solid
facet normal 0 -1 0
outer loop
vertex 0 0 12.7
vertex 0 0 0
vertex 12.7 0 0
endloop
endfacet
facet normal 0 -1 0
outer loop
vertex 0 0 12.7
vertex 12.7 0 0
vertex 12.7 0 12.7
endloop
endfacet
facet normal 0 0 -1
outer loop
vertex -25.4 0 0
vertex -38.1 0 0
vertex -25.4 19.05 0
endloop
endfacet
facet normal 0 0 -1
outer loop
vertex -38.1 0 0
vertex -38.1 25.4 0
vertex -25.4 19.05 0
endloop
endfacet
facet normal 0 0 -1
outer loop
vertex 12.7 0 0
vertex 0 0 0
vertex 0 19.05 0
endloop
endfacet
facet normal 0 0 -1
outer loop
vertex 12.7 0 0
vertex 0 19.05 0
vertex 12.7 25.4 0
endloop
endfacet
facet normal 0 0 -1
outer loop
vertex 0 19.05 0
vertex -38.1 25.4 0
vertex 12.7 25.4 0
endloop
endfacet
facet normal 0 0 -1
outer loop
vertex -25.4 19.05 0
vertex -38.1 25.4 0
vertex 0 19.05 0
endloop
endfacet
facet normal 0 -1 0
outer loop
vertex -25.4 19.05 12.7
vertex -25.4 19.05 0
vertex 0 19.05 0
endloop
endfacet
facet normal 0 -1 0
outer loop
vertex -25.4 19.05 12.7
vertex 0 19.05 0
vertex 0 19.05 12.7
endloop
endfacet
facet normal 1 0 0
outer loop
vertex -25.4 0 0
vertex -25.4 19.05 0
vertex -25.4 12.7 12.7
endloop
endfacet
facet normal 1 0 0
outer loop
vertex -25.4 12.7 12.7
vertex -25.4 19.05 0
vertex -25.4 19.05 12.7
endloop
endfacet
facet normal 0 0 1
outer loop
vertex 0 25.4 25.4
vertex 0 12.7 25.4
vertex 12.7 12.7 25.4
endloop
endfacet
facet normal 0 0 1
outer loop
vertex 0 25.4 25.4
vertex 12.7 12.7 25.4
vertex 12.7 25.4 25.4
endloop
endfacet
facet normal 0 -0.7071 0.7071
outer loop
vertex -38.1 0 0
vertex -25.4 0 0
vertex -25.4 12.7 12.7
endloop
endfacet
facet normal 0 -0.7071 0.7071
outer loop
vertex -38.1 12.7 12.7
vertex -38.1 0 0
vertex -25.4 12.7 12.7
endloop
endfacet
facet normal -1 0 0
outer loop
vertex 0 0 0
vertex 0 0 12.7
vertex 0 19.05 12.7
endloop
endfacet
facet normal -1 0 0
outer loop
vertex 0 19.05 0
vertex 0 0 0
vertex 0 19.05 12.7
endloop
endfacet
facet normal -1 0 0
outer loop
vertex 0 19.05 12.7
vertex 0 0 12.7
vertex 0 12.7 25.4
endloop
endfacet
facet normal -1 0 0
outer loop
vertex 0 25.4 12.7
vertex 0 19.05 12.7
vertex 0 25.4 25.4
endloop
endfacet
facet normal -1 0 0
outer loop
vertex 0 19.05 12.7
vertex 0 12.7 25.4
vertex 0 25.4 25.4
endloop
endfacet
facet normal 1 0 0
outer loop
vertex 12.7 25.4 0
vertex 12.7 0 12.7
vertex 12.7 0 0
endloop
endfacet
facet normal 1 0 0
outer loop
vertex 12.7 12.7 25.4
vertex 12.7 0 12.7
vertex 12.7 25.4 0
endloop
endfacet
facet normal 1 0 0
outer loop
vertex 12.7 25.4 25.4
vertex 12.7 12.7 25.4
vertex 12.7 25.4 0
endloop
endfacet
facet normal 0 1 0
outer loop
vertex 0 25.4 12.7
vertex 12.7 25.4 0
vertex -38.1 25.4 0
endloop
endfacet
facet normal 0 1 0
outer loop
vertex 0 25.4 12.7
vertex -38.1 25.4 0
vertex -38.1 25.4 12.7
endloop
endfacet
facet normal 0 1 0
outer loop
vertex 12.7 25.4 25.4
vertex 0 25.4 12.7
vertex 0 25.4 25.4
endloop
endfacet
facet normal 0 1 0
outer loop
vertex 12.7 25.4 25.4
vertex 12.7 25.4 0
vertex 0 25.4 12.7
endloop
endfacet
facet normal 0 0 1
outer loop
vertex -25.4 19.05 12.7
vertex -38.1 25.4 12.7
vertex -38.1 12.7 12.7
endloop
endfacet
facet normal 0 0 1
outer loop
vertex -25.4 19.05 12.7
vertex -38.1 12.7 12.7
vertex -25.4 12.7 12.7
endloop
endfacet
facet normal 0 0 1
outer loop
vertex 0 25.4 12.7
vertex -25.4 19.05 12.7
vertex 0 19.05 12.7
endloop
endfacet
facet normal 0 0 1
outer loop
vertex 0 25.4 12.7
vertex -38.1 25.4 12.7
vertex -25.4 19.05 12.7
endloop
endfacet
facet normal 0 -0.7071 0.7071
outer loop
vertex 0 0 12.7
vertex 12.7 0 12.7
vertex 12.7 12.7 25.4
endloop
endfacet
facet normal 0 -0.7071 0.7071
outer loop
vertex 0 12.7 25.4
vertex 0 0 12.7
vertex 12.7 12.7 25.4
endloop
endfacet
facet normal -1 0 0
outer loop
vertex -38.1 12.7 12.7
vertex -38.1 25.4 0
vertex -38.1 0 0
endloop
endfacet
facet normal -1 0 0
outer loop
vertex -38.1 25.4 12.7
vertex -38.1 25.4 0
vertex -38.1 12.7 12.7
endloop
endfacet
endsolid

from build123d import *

# Parameters (mm, degrees)
F0_W     = 25.4
F0_H     = 25.4
F1_DEPTH = 12.7
F2_W     = 6.35
F2_H     = 12.7
F3_DEPTH = 38.1
F4_W     = 12.7
F4_H     = 12.7
F5_DEPTH = 19.05
F7_DEPTH = 12.7
F9_DEPTH = 12.7


with BuildPart() as f1:
    # F0 (on Right) → F1 (new body)
    with BuildSketch(Plane.YZ):
        with Locations((12.7, 12.7)):
            Rectangle(F0_W, F0_H)
    extrude(amount=F1_DEPTH)

    # F2 (on Right) → F3 (join)
    with BuildSketch(Plane.YZ):
        with Locations((22.225, 6.35)):
            Rectangle(F2_W, F2_H)
    extrude(amount=-F3_DEPTH)

    # F4 (on face) → F5 (join)
    with BuildSketch(Plane.XZ.offset(-19.05)):
        with Locations((-31.75, 6.35)):
            Rectangle(F4_W, F4_H)
    extrude(amount=F5_DEPTH)

    # F6 (on face) → F7 (cut)
    with BuildSketch(Plane.YZ.offset(12.7)):
        Polygon((12.7, 25.4), (0, 25.4), (0, 12.7), align=None)
    extrude(amount=-F7_DEPTH, mode=Mode.SUBTRACT)

    # F8 (on face) → F9 (cut)
    with BuildSketch(Plane.YZ.offset(-25.4)):
        Polygon((12.7, 12.7), (0, 12.7), (0, 0), align=None)
    extrude(amount=-F9_DEPTH, mode=Mode.SUBTRACT)


solid = f1.part
